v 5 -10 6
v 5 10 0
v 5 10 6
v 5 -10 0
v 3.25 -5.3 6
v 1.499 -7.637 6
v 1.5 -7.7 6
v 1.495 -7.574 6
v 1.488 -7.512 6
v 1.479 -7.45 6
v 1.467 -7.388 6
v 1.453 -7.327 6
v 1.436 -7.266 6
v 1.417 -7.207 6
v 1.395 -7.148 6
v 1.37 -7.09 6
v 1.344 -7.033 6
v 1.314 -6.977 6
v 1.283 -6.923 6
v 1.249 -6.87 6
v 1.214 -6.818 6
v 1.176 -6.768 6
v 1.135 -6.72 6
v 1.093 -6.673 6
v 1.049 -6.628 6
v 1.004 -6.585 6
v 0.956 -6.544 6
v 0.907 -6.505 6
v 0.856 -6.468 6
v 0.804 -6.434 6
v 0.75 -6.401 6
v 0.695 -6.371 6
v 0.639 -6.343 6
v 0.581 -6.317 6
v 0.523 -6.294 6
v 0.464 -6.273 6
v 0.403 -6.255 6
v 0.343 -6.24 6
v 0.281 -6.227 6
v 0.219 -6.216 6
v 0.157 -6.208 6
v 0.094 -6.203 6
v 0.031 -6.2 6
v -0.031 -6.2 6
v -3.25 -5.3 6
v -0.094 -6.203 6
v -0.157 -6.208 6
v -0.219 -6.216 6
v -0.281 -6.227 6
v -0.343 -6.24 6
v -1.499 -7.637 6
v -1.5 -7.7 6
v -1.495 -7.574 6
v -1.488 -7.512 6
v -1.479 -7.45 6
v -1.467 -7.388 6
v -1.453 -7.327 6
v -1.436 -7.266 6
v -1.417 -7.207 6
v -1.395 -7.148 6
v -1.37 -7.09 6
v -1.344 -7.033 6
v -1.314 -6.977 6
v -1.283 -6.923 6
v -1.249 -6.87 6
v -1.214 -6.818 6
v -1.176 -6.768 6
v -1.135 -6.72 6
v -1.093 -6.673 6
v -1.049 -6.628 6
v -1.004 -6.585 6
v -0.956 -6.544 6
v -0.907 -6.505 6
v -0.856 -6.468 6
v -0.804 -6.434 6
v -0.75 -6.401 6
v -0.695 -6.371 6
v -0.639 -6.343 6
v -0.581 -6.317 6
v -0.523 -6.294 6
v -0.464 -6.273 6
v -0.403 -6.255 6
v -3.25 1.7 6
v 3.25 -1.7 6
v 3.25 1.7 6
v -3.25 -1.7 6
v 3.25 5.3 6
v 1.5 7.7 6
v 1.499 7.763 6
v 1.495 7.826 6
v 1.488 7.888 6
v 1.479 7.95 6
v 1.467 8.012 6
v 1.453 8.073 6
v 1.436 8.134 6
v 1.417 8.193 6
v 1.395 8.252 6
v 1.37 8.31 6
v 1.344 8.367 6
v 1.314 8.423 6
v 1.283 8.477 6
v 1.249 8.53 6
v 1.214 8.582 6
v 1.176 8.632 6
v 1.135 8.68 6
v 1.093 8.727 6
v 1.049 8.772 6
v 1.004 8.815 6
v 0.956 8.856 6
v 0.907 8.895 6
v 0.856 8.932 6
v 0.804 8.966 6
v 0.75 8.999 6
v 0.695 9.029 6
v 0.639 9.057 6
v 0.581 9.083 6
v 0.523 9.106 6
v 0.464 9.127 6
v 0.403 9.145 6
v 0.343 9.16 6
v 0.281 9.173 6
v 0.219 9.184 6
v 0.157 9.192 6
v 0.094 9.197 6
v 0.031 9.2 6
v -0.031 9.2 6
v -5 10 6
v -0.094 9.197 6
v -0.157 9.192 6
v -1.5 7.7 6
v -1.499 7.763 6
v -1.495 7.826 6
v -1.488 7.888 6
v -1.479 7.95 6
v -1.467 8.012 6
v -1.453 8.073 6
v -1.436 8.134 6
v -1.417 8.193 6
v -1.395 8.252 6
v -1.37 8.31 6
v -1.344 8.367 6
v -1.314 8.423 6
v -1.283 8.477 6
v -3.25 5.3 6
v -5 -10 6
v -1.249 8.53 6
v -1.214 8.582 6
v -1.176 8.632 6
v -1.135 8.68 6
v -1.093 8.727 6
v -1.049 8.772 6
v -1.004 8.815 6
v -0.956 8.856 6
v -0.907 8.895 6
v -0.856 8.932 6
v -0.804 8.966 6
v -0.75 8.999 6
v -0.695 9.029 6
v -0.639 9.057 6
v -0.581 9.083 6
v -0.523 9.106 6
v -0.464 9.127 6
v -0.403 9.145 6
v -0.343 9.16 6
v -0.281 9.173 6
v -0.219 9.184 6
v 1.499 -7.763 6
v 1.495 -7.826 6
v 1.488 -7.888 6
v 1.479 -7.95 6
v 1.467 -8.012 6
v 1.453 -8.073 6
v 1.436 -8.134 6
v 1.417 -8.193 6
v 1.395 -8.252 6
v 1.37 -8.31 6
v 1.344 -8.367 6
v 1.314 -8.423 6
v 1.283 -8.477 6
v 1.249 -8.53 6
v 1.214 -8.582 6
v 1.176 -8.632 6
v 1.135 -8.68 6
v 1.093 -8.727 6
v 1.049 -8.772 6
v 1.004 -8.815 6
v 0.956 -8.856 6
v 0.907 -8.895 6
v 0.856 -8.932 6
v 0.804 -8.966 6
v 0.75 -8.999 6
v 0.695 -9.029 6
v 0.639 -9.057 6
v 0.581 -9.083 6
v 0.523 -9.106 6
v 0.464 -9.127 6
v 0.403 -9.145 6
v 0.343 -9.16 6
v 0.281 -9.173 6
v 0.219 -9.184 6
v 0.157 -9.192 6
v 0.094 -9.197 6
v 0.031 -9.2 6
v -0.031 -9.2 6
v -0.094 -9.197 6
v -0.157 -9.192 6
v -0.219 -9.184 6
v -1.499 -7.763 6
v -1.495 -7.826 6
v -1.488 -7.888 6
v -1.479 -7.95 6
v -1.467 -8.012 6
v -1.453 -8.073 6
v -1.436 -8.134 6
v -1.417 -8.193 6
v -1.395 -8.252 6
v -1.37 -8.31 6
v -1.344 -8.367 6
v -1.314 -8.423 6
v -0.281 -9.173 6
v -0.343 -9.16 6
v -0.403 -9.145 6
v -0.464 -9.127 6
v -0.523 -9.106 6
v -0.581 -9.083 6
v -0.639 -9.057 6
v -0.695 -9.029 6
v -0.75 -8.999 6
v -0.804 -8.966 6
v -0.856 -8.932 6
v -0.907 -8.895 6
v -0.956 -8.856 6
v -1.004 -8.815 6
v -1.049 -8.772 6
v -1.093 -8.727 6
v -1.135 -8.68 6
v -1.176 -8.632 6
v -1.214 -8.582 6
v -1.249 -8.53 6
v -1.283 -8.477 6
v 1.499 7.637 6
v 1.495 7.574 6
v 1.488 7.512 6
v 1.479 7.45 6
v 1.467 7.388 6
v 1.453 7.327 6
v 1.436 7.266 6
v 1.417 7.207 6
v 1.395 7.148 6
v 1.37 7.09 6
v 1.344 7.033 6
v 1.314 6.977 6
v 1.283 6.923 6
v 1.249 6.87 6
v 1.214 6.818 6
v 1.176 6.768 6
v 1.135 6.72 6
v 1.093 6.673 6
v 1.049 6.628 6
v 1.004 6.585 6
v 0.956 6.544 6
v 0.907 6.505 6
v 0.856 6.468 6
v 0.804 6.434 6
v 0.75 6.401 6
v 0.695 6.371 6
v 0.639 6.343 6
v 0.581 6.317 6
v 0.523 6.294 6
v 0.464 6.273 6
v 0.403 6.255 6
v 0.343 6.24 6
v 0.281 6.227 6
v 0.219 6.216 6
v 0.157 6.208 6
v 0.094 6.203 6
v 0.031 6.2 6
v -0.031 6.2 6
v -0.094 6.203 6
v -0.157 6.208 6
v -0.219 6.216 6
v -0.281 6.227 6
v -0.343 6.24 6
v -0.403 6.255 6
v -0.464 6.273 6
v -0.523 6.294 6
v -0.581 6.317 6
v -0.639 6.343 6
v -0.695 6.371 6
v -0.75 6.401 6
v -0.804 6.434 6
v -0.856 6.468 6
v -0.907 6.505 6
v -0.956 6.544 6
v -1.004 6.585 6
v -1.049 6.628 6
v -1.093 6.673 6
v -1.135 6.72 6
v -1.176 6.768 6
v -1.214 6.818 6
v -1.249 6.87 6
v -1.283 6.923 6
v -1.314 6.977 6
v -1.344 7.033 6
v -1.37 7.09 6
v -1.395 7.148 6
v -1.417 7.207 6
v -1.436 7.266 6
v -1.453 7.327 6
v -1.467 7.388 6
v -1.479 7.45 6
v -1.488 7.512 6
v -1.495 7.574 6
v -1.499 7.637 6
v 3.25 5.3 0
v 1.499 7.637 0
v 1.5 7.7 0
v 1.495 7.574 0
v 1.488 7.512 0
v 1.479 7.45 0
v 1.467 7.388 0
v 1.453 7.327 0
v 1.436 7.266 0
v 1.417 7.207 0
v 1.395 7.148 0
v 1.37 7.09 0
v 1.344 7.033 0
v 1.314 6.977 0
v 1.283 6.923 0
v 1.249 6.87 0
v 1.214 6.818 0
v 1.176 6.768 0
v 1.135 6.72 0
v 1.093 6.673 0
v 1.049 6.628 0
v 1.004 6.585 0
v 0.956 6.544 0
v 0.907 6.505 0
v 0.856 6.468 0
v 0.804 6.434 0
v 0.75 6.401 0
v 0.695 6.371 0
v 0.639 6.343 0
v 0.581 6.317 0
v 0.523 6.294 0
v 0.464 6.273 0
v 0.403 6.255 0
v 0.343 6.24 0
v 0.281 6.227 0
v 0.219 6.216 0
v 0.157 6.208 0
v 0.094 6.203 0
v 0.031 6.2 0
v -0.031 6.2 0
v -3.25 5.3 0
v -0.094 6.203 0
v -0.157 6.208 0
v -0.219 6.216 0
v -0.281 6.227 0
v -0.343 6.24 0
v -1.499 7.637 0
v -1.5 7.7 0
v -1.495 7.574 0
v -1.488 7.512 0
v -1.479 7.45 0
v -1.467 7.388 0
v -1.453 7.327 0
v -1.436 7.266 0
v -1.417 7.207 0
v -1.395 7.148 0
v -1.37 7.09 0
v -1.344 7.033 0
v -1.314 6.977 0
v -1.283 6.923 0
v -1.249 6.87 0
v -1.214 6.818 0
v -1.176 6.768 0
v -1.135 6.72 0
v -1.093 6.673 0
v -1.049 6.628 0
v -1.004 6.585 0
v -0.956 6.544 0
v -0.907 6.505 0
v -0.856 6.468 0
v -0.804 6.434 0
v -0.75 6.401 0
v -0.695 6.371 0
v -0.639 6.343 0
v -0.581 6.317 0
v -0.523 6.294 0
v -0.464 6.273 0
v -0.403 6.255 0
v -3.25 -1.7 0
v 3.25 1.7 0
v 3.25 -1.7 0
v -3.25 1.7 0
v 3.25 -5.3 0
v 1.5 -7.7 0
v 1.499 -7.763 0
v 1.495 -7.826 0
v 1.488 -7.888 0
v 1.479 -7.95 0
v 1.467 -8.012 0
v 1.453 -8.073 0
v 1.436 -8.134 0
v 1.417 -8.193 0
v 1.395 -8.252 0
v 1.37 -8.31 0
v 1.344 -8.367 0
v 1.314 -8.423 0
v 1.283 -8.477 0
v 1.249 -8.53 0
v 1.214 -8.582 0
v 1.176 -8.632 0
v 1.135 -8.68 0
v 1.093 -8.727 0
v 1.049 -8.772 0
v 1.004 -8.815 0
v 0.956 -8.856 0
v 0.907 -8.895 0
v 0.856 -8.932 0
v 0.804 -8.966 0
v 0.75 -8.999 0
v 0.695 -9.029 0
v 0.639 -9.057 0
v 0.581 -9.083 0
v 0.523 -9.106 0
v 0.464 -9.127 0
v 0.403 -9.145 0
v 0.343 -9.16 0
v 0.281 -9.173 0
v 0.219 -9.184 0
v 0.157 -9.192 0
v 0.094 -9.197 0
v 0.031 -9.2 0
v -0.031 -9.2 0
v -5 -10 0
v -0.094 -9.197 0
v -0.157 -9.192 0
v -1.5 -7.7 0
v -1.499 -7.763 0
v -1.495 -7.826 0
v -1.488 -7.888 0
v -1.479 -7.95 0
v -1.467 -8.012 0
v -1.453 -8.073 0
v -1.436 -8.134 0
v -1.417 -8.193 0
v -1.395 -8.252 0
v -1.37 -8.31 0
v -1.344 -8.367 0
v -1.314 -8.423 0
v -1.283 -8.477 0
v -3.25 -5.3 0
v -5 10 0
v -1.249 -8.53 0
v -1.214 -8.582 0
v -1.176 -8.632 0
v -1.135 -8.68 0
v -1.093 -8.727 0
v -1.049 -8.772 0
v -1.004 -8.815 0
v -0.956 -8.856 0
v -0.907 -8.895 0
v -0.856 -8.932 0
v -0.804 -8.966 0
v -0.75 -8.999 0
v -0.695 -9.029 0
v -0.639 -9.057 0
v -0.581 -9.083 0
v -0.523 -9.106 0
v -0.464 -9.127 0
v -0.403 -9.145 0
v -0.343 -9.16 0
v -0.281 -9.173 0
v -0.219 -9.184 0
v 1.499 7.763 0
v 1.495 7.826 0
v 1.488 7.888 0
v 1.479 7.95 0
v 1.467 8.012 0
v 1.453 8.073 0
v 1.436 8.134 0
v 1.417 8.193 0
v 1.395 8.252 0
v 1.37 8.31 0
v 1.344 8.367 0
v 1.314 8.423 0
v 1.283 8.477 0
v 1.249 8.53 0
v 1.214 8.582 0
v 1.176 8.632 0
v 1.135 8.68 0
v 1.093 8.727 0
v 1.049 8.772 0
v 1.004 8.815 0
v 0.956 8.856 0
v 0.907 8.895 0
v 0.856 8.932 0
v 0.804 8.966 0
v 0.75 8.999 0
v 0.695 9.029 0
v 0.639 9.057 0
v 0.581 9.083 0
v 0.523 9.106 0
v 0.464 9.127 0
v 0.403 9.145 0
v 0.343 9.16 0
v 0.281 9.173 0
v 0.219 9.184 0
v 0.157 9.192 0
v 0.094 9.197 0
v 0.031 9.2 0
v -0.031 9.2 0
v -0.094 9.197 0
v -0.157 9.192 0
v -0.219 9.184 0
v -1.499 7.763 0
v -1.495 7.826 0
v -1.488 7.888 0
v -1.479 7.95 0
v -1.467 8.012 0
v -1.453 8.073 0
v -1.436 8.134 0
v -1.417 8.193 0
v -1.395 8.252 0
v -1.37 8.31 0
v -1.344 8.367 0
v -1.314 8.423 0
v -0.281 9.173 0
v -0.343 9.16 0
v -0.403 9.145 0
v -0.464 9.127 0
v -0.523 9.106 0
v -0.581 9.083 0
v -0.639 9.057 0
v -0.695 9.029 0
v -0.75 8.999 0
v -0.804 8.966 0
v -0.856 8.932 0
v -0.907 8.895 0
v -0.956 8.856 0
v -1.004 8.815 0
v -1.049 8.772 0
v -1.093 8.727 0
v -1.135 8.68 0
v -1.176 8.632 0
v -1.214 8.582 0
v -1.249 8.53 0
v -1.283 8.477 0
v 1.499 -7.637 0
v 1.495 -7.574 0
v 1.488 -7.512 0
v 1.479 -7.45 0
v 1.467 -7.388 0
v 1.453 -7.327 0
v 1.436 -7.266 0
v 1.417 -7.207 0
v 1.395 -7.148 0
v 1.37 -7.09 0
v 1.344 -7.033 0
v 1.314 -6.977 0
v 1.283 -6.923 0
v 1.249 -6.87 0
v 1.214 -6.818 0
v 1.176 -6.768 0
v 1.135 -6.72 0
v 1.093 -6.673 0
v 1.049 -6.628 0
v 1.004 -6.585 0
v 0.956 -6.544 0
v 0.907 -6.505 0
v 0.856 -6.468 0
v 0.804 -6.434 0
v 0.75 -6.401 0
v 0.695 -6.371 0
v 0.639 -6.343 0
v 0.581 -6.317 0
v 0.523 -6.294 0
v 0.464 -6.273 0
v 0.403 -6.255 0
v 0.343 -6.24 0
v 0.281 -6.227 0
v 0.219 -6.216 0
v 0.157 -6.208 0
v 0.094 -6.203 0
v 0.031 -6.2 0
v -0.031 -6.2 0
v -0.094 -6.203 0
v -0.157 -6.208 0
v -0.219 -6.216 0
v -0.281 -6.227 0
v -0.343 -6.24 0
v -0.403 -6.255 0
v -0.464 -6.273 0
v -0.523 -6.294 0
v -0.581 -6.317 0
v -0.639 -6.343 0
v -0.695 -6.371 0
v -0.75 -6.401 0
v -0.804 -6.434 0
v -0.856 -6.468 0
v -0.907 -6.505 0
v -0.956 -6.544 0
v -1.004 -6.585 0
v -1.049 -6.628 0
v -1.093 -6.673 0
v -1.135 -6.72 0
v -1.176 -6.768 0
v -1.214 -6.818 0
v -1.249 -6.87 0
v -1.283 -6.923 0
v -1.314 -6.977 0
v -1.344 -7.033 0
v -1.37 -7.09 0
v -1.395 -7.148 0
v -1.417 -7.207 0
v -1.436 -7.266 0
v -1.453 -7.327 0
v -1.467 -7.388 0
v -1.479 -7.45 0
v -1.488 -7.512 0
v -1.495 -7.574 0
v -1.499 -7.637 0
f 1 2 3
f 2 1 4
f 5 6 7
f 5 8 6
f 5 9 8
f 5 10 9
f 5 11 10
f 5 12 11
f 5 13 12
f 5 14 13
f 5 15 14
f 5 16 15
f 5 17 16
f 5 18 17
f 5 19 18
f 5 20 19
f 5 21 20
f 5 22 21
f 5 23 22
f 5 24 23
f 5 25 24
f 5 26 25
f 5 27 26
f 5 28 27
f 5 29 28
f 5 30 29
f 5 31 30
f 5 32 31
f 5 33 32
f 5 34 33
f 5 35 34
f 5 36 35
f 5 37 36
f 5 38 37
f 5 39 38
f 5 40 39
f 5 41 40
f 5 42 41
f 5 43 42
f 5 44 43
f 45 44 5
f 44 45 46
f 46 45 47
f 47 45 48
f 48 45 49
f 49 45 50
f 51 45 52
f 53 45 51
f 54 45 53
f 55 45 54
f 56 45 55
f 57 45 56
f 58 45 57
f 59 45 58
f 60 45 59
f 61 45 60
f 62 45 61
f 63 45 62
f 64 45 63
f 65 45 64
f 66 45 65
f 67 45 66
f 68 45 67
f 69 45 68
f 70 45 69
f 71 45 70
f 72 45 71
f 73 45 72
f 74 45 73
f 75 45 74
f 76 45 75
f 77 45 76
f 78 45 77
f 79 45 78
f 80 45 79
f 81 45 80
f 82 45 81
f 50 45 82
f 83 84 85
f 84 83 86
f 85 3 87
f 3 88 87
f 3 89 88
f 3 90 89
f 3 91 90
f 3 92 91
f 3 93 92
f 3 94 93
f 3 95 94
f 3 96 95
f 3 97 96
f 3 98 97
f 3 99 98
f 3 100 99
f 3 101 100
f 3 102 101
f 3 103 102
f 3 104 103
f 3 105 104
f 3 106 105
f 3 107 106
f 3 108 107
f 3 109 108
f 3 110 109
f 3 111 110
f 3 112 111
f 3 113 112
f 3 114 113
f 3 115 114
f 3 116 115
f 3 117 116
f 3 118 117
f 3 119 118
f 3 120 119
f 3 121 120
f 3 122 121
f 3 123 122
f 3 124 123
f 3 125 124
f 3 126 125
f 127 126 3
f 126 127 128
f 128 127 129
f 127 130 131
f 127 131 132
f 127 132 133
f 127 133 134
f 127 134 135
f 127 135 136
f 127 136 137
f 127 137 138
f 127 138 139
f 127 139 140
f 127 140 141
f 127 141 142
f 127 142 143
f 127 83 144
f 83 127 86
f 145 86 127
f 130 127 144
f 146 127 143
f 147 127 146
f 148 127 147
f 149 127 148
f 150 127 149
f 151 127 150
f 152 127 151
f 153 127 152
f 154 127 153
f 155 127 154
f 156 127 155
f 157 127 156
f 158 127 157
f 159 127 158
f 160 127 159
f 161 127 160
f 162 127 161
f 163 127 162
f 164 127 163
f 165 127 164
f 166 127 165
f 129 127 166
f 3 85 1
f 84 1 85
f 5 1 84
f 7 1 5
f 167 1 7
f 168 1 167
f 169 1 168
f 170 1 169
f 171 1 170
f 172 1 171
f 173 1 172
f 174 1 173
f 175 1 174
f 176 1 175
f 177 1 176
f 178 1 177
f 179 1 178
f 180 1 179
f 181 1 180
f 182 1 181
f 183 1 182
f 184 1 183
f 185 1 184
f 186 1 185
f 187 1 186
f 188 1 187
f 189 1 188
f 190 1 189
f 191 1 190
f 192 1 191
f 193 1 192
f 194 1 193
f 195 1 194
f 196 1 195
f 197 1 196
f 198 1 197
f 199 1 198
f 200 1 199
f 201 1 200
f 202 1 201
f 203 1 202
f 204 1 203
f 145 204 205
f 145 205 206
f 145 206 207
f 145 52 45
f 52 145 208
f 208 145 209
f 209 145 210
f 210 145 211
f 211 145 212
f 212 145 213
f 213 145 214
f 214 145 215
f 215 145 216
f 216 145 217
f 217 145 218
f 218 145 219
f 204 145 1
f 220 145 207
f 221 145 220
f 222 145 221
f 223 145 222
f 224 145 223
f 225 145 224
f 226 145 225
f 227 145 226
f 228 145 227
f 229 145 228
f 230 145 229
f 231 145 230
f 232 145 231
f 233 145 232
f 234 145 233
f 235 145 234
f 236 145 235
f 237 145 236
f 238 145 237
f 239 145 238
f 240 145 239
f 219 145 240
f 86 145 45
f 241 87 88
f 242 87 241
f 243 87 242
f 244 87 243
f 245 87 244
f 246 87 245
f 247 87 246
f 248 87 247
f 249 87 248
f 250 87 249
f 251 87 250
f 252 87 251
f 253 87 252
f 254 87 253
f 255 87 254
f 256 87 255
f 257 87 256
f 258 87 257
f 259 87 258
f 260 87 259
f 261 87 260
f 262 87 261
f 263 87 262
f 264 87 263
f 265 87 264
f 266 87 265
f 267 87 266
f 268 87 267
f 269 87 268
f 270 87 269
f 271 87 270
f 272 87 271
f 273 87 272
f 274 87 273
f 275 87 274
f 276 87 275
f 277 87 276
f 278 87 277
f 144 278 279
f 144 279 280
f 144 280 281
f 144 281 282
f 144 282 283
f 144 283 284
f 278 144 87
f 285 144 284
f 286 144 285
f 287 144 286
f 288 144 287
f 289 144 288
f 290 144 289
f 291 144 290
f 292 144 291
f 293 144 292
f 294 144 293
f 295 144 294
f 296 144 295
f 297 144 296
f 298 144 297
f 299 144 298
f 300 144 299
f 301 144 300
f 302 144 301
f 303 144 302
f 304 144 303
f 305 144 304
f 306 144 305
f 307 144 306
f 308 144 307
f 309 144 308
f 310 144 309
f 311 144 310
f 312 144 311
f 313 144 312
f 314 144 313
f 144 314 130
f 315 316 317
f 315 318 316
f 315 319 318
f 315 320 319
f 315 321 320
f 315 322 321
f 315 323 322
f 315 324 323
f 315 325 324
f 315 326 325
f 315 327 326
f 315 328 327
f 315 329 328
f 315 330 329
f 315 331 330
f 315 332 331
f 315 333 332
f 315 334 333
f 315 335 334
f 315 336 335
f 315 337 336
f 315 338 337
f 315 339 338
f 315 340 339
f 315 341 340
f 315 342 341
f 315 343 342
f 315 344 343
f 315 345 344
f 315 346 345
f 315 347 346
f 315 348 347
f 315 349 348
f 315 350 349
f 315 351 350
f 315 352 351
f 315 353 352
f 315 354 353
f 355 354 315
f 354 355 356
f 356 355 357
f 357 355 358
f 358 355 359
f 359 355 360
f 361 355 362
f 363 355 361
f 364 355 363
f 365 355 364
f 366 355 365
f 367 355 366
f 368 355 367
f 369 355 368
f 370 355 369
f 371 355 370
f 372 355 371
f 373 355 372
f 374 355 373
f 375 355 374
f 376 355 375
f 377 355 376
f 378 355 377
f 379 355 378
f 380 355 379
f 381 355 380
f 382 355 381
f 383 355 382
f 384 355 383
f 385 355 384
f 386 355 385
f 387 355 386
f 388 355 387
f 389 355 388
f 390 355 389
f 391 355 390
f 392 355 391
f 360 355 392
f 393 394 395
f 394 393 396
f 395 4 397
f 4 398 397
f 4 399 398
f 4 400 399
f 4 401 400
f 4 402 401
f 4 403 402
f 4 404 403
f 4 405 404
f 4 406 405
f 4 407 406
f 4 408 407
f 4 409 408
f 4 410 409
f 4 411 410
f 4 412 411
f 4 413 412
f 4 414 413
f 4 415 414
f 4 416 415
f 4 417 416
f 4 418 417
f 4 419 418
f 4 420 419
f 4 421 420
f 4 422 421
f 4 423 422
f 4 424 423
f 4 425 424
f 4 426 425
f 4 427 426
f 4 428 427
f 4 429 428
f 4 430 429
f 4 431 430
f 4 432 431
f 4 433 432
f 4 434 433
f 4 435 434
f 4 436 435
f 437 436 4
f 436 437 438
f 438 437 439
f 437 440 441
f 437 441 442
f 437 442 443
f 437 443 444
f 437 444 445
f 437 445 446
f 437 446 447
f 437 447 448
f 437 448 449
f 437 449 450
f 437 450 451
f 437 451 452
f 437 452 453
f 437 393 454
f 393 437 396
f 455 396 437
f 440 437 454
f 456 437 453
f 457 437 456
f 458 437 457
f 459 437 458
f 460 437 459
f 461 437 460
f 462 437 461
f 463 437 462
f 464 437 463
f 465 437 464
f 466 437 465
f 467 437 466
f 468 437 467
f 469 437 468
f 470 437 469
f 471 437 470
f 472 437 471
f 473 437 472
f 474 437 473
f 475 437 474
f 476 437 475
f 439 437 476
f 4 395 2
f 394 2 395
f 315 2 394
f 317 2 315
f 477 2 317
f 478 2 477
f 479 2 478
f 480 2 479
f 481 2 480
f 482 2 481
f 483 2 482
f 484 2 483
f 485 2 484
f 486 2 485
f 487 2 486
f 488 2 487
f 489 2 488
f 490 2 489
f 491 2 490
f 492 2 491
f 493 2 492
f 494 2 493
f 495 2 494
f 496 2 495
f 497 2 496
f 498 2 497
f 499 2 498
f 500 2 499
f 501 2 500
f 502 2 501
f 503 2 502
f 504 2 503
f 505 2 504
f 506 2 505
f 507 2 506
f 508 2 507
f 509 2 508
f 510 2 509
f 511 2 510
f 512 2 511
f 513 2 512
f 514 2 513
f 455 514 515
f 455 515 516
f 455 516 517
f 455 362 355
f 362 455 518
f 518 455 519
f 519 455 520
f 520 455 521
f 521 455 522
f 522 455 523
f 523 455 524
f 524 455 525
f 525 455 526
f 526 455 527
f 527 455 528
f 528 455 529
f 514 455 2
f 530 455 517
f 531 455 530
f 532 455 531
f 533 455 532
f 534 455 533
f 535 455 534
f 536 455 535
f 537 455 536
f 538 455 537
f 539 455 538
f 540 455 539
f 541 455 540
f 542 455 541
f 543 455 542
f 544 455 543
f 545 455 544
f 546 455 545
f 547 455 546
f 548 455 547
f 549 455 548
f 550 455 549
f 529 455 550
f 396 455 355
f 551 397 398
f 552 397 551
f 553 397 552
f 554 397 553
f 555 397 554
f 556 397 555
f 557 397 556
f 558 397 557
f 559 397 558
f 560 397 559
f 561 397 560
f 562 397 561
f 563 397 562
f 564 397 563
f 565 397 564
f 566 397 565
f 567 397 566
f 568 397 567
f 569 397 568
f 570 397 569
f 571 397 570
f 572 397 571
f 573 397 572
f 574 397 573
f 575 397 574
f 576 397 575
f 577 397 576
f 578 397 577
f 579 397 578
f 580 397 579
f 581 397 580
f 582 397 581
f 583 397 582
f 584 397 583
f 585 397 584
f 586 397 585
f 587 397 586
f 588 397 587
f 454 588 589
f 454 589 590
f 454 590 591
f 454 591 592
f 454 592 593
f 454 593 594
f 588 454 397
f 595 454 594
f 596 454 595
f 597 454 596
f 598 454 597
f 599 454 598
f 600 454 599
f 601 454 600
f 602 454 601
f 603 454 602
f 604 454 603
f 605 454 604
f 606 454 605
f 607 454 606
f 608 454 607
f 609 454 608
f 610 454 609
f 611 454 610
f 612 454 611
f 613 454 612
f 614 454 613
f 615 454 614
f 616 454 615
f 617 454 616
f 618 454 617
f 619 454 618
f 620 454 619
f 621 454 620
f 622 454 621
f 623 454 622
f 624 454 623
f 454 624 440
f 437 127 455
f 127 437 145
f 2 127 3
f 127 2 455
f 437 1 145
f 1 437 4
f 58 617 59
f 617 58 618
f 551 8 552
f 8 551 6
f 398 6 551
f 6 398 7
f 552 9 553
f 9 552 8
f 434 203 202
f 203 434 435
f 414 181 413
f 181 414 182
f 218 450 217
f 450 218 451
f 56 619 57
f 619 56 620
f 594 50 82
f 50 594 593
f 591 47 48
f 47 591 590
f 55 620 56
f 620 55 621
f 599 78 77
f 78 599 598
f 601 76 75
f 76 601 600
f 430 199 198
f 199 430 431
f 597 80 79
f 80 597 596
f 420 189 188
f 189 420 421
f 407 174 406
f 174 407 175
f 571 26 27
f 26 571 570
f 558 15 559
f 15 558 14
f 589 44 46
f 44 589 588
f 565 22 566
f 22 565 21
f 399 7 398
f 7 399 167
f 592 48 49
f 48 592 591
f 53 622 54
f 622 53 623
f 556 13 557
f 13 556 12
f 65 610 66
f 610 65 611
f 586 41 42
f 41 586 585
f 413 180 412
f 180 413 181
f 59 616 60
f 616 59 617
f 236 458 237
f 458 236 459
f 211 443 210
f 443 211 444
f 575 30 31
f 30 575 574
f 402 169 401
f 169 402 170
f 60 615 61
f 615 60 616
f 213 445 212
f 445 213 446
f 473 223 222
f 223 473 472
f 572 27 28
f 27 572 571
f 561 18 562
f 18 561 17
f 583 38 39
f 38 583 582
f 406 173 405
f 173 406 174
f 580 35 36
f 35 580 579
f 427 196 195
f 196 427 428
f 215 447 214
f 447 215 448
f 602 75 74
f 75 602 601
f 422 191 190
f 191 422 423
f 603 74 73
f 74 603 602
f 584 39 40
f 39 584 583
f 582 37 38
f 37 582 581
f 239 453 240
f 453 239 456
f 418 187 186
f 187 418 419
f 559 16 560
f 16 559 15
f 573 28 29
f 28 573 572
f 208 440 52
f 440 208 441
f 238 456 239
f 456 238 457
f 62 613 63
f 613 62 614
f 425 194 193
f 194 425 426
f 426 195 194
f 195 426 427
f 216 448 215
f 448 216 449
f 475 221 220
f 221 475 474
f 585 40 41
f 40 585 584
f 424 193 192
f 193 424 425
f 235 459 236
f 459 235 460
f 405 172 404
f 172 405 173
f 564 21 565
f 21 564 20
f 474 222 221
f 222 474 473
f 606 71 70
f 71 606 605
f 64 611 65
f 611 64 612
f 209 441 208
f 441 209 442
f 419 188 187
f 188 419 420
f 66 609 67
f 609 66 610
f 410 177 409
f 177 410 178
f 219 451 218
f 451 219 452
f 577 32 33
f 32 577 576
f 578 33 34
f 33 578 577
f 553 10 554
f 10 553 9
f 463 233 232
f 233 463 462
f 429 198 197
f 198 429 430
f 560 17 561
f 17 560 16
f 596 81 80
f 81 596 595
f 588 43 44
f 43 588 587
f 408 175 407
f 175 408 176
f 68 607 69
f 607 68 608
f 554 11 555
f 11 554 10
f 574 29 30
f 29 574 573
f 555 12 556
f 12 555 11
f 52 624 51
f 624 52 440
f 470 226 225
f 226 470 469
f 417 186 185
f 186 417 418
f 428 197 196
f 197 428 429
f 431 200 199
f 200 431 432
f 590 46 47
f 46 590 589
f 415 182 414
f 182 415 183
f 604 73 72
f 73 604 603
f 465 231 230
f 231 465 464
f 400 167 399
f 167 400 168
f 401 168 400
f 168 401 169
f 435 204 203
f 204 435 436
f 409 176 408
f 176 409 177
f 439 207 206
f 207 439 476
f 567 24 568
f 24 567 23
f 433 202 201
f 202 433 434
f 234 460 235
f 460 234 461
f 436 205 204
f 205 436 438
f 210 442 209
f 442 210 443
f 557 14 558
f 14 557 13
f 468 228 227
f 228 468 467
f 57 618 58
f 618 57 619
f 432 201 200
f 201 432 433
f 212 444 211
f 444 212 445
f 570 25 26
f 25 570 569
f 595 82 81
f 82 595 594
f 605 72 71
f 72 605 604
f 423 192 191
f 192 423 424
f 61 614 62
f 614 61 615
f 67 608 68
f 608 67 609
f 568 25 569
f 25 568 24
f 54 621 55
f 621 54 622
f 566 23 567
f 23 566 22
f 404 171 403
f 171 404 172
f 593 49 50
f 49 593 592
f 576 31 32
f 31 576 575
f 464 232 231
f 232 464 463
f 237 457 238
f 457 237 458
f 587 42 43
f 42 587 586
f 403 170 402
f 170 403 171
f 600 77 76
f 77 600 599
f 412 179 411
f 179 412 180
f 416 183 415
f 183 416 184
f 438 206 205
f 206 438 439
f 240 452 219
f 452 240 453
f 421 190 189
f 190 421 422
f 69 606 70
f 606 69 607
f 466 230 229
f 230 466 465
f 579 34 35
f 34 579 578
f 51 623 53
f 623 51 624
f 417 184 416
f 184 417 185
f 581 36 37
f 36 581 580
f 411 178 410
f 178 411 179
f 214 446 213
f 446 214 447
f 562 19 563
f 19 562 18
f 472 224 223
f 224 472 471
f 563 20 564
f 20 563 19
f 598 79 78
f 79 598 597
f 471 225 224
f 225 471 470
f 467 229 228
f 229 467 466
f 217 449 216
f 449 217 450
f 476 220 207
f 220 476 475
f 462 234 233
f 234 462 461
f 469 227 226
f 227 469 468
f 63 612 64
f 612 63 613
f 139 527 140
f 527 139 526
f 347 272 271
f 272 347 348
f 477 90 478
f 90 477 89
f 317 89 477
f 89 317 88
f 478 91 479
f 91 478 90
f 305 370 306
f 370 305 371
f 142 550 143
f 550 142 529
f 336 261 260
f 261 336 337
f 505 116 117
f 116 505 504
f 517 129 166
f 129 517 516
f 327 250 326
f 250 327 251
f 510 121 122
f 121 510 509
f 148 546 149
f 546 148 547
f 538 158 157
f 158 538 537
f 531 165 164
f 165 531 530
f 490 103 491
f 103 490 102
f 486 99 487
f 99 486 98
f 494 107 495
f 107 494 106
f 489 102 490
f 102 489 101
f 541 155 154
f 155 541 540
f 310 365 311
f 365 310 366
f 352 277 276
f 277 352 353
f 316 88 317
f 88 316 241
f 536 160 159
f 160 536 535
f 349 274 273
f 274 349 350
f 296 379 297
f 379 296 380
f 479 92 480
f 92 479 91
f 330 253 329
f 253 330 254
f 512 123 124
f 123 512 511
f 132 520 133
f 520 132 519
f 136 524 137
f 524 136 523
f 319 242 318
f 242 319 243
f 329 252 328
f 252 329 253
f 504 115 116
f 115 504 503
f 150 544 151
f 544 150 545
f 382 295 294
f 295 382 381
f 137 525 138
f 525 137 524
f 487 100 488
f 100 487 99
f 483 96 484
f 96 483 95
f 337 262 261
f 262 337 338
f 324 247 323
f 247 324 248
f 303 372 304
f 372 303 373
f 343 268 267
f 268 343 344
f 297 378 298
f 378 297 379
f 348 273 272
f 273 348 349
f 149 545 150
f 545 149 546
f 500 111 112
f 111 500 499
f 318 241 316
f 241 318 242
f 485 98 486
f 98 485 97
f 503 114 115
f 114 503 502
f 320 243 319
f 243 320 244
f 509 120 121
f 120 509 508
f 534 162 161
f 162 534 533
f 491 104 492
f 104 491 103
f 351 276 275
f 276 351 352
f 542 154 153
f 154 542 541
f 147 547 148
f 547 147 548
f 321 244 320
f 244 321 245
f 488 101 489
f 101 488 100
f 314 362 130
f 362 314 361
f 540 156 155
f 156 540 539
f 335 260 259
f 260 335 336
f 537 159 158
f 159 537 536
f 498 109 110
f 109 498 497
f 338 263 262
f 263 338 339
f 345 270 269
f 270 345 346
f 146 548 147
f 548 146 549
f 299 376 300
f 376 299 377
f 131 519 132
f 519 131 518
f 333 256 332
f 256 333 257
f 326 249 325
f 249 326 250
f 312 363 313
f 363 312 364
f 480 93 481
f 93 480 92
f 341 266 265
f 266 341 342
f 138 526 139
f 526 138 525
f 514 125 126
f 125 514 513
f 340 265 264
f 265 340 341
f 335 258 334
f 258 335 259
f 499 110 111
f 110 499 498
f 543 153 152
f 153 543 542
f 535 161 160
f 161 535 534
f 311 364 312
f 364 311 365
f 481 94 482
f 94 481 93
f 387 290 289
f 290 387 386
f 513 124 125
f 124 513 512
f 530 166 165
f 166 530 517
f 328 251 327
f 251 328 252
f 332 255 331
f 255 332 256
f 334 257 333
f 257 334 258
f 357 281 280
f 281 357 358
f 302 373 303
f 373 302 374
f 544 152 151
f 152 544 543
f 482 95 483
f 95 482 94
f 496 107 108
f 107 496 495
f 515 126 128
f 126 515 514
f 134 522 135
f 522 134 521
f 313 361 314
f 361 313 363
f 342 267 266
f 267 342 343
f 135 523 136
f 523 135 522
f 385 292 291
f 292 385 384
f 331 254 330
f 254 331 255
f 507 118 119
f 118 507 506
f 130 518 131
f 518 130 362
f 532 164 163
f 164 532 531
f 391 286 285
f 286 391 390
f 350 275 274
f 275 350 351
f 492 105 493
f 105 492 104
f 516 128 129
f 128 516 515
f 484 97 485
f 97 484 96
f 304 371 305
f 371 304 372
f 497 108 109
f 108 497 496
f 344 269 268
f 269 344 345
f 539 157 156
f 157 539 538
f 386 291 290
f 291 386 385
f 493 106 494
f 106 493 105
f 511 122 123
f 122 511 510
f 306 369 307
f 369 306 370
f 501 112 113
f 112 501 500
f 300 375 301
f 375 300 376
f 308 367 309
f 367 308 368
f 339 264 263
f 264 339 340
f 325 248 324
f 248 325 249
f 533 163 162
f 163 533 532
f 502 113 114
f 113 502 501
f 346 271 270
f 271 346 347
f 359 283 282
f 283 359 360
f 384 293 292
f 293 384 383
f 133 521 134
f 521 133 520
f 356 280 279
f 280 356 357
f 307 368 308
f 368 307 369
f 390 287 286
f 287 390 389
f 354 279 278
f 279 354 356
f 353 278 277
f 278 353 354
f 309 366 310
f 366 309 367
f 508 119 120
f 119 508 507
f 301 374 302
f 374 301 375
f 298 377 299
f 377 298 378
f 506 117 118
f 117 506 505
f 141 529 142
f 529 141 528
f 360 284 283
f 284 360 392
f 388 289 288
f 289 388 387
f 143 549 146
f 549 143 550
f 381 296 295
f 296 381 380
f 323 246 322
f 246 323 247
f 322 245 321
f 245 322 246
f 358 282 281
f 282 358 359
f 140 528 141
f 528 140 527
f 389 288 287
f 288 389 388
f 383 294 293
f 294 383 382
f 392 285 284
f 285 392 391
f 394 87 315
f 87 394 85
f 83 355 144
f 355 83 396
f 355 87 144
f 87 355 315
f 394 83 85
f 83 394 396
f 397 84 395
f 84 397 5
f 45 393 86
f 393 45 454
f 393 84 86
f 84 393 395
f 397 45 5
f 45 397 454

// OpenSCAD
difference(){

translate([0,0,3]){

cube([10,20,6],center=true);}

translate([0,-7.7,3]){
cylinder(h=6.3, r=1.5,$fn=150, center=true);}

translate([0,7.7,3]){

cylinder(h=6.3, r=1.5,$fn=150, center=true);}

translate([0,3.5,3]){

cube([6.5,3.6,6],center=true);}

translate([0,-3.5,3]){

cube([6.5,3.6,6],center=true);}
}
